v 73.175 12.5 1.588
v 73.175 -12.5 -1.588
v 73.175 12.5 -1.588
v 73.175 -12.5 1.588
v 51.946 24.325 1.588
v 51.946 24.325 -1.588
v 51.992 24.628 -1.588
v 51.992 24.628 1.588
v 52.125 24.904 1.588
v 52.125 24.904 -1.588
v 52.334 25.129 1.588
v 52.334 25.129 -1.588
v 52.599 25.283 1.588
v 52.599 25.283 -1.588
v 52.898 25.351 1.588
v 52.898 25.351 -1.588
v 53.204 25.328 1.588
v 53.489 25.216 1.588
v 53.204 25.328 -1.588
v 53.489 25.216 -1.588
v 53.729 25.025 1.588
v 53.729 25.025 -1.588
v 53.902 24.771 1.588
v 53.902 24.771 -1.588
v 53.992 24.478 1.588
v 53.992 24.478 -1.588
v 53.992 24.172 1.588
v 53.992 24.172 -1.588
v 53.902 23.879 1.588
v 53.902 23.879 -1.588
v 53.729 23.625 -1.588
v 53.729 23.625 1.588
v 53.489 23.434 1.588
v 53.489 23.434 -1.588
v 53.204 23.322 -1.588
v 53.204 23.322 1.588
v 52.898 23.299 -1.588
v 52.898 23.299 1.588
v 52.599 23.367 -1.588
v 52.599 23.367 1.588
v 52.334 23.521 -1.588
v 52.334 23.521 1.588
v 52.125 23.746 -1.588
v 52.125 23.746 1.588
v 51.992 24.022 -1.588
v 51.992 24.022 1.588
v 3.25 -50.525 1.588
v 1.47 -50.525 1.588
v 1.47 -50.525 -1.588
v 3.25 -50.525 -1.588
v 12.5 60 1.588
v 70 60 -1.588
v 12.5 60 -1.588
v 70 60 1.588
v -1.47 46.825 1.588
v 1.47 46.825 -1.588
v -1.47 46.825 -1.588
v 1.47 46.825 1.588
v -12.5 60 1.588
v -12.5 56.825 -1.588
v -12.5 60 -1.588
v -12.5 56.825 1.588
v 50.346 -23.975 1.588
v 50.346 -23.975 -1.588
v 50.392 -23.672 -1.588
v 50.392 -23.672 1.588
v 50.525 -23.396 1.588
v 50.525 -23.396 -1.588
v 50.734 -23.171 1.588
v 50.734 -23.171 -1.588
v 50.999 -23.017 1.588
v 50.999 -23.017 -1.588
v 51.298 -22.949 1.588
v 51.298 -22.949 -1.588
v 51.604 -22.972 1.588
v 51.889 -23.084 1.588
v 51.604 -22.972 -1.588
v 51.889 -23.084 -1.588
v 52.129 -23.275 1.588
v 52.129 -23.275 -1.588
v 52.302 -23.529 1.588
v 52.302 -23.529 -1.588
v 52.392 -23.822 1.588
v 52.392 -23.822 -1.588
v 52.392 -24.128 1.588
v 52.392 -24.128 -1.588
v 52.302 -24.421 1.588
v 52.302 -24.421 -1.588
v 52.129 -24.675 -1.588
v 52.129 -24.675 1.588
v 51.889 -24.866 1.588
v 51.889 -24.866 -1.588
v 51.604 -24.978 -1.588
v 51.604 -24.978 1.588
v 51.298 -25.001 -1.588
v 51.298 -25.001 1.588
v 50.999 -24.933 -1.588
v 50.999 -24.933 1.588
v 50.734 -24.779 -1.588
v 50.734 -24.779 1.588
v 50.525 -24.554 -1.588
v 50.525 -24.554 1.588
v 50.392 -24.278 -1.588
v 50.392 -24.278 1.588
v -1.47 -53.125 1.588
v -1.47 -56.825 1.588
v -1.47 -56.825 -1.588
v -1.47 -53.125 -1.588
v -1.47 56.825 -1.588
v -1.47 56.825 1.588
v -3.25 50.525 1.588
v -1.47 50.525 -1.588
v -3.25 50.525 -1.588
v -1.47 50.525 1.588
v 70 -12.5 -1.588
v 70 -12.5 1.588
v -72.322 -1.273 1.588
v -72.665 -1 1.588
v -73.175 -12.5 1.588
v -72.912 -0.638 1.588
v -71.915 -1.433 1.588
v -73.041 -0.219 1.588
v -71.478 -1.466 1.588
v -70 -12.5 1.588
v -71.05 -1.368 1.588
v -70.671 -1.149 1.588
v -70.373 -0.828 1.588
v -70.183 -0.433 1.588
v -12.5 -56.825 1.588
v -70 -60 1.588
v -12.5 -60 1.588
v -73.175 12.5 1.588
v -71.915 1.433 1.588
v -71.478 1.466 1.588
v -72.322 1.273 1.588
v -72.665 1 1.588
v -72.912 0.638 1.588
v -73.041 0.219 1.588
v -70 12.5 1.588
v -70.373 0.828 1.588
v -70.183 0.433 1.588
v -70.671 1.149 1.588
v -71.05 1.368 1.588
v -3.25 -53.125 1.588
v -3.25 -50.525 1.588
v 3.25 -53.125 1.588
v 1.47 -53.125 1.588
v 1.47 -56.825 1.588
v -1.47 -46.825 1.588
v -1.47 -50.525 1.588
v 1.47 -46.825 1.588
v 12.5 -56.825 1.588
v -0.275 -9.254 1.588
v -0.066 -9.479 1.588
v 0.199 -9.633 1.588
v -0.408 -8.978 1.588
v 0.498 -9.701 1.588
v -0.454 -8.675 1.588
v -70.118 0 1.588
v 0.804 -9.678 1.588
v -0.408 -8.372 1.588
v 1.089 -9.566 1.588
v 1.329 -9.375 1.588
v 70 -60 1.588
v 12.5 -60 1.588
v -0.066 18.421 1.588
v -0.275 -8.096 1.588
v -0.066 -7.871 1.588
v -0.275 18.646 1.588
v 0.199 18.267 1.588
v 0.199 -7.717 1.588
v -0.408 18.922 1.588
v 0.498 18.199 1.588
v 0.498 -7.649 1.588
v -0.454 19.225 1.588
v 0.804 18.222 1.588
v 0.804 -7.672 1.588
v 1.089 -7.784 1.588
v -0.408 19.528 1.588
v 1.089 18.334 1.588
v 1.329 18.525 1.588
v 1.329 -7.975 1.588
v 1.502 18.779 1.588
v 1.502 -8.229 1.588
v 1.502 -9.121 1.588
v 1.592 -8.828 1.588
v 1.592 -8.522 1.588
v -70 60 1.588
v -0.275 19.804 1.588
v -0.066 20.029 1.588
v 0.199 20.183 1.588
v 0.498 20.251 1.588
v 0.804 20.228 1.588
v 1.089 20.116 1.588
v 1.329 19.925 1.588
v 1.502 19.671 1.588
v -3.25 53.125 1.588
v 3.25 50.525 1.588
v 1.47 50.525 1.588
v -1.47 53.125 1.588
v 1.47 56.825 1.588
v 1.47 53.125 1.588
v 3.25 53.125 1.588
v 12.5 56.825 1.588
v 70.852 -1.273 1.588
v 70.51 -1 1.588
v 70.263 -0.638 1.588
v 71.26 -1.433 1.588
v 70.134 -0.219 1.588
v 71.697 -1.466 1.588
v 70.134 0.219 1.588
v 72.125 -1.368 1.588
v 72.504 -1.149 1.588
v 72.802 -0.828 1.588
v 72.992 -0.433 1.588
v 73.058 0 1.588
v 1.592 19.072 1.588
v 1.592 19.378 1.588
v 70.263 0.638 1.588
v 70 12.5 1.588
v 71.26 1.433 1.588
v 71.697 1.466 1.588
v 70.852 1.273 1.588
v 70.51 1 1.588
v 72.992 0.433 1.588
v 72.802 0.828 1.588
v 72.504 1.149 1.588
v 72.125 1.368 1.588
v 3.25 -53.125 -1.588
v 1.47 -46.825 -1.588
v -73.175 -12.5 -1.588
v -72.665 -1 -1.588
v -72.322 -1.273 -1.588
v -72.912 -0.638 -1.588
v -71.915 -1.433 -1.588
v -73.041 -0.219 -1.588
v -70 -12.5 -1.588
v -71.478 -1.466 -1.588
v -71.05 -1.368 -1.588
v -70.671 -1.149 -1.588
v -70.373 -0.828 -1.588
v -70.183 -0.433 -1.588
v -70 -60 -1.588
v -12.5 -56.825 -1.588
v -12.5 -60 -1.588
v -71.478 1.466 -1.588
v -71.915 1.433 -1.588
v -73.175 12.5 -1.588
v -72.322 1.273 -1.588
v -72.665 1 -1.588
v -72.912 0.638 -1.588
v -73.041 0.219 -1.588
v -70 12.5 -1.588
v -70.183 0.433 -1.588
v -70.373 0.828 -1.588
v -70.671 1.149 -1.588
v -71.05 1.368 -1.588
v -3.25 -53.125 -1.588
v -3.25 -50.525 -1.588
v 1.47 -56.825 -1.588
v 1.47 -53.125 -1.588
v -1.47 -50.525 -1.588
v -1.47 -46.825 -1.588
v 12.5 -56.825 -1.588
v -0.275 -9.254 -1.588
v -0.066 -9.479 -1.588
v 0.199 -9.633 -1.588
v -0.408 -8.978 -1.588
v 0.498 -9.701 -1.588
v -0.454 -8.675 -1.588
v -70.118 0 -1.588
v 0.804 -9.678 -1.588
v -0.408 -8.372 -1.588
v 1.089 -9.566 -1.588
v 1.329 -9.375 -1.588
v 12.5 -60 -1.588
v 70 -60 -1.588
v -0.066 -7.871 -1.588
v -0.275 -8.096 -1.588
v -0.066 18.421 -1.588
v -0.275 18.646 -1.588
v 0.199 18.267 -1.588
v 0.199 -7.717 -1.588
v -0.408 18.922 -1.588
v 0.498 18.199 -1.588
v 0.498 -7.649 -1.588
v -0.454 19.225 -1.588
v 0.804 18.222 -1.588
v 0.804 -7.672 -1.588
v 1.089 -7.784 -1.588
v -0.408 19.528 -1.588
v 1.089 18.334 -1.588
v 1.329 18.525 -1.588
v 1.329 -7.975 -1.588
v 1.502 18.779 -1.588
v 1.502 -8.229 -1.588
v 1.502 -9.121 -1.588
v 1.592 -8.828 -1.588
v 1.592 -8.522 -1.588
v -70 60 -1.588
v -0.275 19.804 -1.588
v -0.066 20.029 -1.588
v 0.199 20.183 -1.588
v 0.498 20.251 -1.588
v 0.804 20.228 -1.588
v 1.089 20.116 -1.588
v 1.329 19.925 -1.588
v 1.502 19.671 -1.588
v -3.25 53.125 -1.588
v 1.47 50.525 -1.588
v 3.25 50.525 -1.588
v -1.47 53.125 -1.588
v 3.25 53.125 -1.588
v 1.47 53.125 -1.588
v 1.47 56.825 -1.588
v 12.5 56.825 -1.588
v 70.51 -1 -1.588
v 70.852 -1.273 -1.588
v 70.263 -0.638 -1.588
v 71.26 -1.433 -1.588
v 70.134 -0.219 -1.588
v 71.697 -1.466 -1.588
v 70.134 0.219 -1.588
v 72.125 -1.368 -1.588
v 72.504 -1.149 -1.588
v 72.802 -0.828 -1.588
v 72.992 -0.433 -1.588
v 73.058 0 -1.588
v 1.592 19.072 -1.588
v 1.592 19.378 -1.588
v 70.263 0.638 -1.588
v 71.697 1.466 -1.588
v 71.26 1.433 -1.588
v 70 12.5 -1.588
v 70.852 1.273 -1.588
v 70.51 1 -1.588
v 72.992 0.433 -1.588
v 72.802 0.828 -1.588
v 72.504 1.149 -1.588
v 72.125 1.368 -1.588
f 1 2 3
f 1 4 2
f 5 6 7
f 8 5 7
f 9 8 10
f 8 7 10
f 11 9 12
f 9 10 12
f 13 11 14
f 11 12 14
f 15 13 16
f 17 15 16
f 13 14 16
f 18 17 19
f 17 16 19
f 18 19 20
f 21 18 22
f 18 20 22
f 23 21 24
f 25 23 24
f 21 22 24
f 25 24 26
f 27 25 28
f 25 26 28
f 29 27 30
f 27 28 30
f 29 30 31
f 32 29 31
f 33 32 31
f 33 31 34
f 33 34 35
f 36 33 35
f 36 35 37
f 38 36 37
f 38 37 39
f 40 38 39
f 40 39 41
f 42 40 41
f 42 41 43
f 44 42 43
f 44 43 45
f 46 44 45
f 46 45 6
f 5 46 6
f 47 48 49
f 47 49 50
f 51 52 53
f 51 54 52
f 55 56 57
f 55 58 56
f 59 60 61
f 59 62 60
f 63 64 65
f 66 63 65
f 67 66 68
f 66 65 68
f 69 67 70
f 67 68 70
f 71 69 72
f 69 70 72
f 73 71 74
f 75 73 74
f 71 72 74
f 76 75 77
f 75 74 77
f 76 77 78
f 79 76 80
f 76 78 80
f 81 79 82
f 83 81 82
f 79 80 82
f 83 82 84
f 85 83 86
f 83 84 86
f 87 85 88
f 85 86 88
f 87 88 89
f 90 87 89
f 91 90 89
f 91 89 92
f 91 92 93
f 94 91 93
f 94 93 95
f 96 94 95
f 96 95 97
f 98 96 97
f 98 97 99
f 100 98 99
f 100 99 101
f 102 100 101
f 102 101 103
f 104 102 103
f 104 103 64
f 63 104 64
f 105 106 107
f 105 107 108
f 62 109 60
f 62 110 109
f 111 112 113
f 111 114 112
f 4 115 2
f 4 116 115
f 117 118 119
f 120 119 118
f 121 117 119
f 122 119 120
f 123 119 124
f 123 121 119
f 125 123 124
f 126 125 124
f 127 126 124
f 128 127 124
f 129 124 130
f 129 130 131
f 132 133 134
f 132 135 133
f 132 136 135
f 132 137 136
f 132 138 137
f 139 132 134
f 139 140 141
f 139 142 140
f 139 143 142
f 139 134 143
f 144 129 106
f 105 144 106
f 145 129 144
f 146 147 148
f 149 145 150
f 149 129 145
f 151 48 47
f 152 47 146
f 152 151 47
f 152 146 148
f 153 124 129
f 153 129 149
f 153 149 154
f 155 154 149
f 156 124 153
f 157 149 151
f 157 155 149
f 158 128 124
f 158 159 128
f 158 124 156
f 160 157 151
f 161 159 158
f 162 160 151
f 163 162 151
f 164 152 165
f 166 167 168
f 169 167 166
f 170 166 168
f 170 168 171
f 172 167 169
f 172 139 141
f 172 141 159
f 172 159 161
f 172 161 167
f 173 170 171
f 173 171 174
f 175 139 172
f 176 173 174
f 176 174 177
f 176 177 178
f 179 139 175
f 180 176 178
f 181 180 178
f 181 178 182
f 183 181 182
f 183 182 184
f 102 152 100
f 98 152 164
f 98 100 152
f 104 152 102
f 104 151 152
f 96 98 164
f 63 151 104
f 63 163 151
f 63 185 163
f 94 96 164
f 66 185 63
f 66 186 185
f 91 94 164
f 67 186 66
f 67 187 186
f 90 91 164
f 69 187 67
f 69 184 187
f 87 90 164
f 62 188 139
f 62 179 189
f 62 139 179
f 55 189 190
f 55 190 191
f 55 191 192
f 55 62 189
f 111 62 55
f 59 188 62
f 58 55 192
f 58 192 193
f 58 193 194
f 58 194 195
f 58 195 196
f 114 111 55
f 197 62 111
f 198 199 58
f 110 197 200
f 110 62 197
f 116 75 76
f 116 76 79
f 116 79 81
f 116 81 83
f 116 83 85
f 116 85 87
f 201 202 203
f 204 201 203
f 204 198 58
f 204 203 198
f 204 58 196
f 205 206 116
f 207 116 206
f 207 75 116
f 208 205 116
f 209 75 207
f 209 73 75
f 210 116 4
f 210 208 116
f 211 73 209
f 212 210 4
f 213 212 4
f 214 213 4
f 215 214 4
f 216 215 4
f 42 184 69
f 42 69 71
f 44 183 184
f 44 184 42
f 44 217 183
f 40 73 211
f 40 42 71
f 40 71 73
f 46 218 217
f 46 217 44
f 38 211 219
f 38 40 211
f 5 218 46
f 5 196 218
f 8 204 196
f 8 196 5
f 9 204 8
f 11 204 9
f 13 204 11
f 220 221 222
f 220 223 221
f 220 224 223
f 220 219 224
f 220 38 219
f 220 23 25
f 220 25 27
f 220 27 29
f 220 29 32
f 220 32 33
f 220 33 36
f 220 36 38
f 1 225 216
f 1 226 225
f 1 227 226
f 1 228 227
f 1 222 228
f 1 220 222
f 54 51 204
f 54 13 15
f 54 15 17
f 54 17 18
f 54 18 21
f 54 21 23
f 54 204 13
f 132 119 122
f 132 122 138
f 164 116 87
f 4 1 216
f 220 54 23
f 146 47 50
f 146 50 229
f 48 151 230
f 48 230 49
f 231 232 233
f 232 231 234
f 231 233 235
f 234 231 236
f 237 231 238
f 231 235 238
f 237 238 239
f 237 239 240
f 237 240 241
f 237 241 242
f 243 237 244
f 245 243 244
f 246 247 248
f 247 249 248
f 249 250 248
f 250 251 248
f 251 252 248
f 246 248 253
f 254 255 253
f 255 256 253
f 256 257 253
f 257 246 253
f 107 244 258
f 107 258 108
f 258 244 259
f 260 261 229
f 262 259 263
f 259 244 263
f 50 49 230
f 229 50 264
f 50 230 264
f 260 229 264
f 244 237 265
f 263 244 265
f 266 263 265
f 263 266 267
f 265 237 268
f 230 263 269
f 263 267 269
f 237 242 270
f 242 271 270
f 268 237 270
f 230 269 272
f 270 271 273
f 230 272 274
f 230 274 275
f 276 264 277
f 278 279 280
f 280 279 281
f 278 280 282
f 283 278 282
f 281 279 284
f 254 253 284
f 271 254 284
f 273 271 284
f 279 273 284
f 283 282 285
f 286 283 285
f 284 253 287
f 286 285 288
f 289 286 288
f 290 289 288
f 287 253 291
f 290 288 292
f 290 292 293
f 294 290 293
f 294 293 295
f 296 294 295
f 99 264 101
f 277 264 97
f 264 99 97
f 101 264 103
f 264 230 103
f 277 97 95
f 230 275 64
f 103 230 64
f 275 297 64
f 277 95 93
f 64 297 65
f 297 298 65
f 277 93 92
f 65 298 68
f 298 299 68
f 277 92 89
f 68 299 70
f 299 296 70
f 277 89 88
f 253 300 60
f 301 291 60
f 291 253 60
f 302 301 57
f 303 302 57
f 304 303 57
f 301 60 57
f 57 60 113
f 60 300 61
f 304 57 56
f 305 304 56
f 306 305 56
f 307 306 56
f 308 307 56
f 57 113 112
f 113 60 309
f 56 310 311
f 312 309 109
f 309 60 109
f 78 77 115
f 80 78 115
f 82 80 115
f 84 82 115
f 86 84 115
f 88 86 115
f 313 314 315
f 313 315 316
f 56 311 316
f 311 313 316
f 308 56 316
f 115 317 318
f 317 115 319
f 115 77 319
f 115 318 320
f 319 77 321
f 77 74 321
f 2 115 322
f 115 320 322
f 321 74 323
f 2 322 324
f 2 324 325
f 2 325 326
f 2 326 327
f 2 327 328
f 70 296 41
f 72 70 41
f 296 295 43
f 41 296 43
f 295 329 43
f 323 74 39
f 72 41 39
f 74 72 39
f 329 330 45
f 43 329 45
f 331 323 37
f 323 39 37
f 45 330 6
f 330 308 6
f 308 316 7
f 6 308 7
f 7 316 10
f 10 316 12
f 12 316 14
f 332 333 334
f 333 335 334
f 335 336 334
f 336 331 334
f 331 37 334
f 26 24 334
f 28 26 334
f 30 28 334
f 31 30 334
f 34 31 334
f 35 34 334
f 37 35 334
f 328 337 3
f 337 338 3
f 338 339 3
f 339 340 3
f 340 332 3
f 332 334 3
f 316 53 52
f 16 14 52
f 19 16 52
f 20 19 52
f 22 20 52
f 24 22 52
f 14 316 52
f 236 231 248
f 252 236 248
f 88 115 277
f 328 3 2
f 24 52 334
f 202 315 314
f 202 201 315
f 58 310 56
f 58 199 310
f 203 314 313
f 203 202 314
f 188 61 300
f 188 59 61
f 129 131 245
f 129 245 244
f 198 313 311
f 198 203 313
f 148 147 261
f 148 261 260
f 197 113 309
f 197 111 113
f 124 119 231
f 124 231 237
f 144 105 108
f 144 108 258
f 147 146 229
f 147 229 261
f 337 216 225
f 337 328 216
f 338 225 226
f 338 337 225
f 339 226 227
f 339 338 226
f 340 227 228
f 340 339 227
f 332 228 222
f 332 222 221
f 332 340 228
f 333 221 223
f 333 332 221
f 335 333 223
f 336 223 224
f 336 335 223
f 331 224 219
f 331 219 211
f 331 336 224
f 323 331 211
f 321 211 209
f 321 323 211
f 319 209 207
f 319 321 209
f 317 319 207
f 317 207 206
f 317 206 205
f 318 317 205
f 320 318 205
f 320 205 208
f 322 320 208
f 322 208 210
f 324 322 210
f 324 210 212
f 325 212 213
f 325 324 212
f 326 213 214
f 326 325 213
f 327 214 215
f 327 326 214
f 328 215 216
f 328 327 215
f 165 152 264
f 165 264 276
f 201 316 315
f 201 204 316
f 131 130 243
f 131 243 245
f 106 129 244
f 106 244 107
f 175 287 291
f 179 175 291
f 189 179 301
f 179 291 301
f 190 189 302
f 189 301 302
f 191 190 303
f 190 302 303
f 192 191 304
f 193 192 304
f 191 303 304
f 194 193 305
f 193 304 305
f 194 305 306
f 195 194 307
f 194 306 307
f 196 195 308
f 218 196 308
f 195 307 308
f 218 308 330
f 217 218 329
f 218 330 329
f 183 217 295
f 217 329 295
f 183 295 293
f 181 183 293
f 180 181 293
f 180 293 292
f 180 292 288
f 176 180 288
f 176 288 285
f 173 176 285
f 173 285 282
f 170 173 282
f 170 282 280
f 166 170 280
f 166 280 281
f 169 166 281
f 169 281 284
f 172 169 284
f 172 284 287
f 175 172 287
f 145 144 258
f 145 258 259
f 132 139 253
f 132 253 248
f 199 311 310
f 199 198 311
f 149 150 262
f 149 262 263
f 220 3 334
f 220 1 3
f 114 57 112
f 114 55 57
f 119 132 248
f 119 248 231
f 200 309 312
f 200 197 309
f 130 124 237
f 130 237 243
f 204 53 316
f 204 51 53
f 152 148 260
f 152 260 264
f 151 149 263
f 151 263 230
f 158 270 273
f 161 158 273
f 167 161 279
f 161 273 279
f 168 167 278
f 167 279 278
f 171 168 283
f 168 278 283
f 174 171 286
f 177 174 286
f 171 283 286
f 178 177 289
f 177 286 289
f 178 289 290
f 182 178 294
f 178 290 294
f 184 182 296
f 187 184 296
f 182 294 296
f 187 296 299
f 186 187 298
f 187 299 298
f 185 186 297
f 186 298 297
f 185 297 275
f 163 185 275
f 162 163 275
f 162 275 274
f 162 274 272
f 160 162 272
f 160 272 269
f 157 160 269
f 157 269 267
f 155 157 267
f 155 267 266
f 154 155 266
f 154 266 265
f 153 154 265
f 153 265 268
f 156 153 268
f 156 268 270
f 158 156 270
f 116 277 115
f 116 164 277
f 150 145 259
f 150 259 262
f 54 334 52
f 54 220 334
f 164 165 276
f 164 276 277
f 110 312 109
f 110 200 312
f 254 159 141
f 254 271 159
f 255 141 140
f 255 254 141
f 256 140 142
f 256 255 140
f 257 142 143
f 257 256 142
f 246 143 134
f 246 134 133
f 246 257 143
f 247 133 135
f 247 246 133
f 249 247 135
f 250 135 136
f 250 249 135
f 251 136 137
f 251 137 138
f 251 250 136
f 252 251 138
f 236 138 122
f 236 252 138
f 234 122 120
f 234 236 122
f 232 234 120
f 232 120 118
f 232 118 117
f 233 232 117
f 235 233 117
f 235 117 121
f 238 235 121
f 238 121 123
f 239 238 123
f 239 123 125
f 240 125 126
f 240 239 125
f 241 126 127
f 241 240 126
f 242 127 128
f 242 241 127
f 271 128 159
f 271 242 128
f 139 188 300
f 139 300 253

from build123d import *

# Parameters (mm, degrees)
SKETCH1_R           = 1.47
BOSS_EXTRUDE1_DEPTH = 1.5875
SKETCH3_R           = 1.0287
CUT_EXTRUDE1_DEPTH  = 4.175


with BuildPart() as part:
    # Sketch1 → Boss-Extrude1 (new body, symmetric)
    with BuildSketch(Plane.XY):
        Polygon((-12.5, 60), (-70, 60), (-70, 12.5), (-73.175, 12.5), (-73.175, -12.5), (-70, -12.5), (-70, -60), (-12.5, -60), (-12.5, -56.825), (-1.47, -56.825), (-1.47, -53.125), (-3.25, -53.125), (-3.25, -50.525), (-1.47, -50.525), (-1.47, -46.825), (1.47, -46.825), (1.47, -50.525), (3.25, -50.525), (3.25, -53.125), (1.47, -53.125), (1.47, -56.825), (12.5, -56.825), (12.5, -60), (70, -60), (70, -12.5), (73.175, -12.5), (73.175, 12.5), (70, 12.5), (70, 60), (12.5, 60), (12.5, 56.825), (1.47, 56.825), (1.47, 53.125), (3.25, 53.125), (3.25, 50.525), (1.47, 50.525), (1.47, 46.825), (-1.47, 46.825), (-1.47, 50.525), (-3.25, 50.525), (-3.25, 53.125), (-1.47, 53.125), (-1.47, 56.825), (-12.5, 56.825), align=None)
        with Locations((-71.5875, 0)):
            Circle(SKETCH1_R, mode=Mode.SUBTRACT)
        with Locations((71.5875, 0)):
            Circle(SKETCH1_R, mode=Mode.SUBTRACT)
    extrude(amount=BOSS_EXTRUDE1_DEPTH, both=True)

    # Sketch3 → Cut-Extrude1 (cut, through all)
    with BuildSketch(Plane(origin=(0, 0, -1.5875), x_dir=(-1, 0, 0), z_dir=(0, 0, -1))):
        with Locations((-51.375, -23.975)):
            Circle(SKETCH3_R)
        with Locations((-52.975, 24.325)):
            Circle(SKETCH3_R)
        with Locations((-0.575, -8.675)):
            Circle(SKETCH3_R)
        with Locations((-0.575, 19.225)):
            Circle(SKETCH3_R)
    extrude(amount=-CUT_EXTRUDE1_DEPTH, mode=Mode.SUBTRACT)


solid = part.part
